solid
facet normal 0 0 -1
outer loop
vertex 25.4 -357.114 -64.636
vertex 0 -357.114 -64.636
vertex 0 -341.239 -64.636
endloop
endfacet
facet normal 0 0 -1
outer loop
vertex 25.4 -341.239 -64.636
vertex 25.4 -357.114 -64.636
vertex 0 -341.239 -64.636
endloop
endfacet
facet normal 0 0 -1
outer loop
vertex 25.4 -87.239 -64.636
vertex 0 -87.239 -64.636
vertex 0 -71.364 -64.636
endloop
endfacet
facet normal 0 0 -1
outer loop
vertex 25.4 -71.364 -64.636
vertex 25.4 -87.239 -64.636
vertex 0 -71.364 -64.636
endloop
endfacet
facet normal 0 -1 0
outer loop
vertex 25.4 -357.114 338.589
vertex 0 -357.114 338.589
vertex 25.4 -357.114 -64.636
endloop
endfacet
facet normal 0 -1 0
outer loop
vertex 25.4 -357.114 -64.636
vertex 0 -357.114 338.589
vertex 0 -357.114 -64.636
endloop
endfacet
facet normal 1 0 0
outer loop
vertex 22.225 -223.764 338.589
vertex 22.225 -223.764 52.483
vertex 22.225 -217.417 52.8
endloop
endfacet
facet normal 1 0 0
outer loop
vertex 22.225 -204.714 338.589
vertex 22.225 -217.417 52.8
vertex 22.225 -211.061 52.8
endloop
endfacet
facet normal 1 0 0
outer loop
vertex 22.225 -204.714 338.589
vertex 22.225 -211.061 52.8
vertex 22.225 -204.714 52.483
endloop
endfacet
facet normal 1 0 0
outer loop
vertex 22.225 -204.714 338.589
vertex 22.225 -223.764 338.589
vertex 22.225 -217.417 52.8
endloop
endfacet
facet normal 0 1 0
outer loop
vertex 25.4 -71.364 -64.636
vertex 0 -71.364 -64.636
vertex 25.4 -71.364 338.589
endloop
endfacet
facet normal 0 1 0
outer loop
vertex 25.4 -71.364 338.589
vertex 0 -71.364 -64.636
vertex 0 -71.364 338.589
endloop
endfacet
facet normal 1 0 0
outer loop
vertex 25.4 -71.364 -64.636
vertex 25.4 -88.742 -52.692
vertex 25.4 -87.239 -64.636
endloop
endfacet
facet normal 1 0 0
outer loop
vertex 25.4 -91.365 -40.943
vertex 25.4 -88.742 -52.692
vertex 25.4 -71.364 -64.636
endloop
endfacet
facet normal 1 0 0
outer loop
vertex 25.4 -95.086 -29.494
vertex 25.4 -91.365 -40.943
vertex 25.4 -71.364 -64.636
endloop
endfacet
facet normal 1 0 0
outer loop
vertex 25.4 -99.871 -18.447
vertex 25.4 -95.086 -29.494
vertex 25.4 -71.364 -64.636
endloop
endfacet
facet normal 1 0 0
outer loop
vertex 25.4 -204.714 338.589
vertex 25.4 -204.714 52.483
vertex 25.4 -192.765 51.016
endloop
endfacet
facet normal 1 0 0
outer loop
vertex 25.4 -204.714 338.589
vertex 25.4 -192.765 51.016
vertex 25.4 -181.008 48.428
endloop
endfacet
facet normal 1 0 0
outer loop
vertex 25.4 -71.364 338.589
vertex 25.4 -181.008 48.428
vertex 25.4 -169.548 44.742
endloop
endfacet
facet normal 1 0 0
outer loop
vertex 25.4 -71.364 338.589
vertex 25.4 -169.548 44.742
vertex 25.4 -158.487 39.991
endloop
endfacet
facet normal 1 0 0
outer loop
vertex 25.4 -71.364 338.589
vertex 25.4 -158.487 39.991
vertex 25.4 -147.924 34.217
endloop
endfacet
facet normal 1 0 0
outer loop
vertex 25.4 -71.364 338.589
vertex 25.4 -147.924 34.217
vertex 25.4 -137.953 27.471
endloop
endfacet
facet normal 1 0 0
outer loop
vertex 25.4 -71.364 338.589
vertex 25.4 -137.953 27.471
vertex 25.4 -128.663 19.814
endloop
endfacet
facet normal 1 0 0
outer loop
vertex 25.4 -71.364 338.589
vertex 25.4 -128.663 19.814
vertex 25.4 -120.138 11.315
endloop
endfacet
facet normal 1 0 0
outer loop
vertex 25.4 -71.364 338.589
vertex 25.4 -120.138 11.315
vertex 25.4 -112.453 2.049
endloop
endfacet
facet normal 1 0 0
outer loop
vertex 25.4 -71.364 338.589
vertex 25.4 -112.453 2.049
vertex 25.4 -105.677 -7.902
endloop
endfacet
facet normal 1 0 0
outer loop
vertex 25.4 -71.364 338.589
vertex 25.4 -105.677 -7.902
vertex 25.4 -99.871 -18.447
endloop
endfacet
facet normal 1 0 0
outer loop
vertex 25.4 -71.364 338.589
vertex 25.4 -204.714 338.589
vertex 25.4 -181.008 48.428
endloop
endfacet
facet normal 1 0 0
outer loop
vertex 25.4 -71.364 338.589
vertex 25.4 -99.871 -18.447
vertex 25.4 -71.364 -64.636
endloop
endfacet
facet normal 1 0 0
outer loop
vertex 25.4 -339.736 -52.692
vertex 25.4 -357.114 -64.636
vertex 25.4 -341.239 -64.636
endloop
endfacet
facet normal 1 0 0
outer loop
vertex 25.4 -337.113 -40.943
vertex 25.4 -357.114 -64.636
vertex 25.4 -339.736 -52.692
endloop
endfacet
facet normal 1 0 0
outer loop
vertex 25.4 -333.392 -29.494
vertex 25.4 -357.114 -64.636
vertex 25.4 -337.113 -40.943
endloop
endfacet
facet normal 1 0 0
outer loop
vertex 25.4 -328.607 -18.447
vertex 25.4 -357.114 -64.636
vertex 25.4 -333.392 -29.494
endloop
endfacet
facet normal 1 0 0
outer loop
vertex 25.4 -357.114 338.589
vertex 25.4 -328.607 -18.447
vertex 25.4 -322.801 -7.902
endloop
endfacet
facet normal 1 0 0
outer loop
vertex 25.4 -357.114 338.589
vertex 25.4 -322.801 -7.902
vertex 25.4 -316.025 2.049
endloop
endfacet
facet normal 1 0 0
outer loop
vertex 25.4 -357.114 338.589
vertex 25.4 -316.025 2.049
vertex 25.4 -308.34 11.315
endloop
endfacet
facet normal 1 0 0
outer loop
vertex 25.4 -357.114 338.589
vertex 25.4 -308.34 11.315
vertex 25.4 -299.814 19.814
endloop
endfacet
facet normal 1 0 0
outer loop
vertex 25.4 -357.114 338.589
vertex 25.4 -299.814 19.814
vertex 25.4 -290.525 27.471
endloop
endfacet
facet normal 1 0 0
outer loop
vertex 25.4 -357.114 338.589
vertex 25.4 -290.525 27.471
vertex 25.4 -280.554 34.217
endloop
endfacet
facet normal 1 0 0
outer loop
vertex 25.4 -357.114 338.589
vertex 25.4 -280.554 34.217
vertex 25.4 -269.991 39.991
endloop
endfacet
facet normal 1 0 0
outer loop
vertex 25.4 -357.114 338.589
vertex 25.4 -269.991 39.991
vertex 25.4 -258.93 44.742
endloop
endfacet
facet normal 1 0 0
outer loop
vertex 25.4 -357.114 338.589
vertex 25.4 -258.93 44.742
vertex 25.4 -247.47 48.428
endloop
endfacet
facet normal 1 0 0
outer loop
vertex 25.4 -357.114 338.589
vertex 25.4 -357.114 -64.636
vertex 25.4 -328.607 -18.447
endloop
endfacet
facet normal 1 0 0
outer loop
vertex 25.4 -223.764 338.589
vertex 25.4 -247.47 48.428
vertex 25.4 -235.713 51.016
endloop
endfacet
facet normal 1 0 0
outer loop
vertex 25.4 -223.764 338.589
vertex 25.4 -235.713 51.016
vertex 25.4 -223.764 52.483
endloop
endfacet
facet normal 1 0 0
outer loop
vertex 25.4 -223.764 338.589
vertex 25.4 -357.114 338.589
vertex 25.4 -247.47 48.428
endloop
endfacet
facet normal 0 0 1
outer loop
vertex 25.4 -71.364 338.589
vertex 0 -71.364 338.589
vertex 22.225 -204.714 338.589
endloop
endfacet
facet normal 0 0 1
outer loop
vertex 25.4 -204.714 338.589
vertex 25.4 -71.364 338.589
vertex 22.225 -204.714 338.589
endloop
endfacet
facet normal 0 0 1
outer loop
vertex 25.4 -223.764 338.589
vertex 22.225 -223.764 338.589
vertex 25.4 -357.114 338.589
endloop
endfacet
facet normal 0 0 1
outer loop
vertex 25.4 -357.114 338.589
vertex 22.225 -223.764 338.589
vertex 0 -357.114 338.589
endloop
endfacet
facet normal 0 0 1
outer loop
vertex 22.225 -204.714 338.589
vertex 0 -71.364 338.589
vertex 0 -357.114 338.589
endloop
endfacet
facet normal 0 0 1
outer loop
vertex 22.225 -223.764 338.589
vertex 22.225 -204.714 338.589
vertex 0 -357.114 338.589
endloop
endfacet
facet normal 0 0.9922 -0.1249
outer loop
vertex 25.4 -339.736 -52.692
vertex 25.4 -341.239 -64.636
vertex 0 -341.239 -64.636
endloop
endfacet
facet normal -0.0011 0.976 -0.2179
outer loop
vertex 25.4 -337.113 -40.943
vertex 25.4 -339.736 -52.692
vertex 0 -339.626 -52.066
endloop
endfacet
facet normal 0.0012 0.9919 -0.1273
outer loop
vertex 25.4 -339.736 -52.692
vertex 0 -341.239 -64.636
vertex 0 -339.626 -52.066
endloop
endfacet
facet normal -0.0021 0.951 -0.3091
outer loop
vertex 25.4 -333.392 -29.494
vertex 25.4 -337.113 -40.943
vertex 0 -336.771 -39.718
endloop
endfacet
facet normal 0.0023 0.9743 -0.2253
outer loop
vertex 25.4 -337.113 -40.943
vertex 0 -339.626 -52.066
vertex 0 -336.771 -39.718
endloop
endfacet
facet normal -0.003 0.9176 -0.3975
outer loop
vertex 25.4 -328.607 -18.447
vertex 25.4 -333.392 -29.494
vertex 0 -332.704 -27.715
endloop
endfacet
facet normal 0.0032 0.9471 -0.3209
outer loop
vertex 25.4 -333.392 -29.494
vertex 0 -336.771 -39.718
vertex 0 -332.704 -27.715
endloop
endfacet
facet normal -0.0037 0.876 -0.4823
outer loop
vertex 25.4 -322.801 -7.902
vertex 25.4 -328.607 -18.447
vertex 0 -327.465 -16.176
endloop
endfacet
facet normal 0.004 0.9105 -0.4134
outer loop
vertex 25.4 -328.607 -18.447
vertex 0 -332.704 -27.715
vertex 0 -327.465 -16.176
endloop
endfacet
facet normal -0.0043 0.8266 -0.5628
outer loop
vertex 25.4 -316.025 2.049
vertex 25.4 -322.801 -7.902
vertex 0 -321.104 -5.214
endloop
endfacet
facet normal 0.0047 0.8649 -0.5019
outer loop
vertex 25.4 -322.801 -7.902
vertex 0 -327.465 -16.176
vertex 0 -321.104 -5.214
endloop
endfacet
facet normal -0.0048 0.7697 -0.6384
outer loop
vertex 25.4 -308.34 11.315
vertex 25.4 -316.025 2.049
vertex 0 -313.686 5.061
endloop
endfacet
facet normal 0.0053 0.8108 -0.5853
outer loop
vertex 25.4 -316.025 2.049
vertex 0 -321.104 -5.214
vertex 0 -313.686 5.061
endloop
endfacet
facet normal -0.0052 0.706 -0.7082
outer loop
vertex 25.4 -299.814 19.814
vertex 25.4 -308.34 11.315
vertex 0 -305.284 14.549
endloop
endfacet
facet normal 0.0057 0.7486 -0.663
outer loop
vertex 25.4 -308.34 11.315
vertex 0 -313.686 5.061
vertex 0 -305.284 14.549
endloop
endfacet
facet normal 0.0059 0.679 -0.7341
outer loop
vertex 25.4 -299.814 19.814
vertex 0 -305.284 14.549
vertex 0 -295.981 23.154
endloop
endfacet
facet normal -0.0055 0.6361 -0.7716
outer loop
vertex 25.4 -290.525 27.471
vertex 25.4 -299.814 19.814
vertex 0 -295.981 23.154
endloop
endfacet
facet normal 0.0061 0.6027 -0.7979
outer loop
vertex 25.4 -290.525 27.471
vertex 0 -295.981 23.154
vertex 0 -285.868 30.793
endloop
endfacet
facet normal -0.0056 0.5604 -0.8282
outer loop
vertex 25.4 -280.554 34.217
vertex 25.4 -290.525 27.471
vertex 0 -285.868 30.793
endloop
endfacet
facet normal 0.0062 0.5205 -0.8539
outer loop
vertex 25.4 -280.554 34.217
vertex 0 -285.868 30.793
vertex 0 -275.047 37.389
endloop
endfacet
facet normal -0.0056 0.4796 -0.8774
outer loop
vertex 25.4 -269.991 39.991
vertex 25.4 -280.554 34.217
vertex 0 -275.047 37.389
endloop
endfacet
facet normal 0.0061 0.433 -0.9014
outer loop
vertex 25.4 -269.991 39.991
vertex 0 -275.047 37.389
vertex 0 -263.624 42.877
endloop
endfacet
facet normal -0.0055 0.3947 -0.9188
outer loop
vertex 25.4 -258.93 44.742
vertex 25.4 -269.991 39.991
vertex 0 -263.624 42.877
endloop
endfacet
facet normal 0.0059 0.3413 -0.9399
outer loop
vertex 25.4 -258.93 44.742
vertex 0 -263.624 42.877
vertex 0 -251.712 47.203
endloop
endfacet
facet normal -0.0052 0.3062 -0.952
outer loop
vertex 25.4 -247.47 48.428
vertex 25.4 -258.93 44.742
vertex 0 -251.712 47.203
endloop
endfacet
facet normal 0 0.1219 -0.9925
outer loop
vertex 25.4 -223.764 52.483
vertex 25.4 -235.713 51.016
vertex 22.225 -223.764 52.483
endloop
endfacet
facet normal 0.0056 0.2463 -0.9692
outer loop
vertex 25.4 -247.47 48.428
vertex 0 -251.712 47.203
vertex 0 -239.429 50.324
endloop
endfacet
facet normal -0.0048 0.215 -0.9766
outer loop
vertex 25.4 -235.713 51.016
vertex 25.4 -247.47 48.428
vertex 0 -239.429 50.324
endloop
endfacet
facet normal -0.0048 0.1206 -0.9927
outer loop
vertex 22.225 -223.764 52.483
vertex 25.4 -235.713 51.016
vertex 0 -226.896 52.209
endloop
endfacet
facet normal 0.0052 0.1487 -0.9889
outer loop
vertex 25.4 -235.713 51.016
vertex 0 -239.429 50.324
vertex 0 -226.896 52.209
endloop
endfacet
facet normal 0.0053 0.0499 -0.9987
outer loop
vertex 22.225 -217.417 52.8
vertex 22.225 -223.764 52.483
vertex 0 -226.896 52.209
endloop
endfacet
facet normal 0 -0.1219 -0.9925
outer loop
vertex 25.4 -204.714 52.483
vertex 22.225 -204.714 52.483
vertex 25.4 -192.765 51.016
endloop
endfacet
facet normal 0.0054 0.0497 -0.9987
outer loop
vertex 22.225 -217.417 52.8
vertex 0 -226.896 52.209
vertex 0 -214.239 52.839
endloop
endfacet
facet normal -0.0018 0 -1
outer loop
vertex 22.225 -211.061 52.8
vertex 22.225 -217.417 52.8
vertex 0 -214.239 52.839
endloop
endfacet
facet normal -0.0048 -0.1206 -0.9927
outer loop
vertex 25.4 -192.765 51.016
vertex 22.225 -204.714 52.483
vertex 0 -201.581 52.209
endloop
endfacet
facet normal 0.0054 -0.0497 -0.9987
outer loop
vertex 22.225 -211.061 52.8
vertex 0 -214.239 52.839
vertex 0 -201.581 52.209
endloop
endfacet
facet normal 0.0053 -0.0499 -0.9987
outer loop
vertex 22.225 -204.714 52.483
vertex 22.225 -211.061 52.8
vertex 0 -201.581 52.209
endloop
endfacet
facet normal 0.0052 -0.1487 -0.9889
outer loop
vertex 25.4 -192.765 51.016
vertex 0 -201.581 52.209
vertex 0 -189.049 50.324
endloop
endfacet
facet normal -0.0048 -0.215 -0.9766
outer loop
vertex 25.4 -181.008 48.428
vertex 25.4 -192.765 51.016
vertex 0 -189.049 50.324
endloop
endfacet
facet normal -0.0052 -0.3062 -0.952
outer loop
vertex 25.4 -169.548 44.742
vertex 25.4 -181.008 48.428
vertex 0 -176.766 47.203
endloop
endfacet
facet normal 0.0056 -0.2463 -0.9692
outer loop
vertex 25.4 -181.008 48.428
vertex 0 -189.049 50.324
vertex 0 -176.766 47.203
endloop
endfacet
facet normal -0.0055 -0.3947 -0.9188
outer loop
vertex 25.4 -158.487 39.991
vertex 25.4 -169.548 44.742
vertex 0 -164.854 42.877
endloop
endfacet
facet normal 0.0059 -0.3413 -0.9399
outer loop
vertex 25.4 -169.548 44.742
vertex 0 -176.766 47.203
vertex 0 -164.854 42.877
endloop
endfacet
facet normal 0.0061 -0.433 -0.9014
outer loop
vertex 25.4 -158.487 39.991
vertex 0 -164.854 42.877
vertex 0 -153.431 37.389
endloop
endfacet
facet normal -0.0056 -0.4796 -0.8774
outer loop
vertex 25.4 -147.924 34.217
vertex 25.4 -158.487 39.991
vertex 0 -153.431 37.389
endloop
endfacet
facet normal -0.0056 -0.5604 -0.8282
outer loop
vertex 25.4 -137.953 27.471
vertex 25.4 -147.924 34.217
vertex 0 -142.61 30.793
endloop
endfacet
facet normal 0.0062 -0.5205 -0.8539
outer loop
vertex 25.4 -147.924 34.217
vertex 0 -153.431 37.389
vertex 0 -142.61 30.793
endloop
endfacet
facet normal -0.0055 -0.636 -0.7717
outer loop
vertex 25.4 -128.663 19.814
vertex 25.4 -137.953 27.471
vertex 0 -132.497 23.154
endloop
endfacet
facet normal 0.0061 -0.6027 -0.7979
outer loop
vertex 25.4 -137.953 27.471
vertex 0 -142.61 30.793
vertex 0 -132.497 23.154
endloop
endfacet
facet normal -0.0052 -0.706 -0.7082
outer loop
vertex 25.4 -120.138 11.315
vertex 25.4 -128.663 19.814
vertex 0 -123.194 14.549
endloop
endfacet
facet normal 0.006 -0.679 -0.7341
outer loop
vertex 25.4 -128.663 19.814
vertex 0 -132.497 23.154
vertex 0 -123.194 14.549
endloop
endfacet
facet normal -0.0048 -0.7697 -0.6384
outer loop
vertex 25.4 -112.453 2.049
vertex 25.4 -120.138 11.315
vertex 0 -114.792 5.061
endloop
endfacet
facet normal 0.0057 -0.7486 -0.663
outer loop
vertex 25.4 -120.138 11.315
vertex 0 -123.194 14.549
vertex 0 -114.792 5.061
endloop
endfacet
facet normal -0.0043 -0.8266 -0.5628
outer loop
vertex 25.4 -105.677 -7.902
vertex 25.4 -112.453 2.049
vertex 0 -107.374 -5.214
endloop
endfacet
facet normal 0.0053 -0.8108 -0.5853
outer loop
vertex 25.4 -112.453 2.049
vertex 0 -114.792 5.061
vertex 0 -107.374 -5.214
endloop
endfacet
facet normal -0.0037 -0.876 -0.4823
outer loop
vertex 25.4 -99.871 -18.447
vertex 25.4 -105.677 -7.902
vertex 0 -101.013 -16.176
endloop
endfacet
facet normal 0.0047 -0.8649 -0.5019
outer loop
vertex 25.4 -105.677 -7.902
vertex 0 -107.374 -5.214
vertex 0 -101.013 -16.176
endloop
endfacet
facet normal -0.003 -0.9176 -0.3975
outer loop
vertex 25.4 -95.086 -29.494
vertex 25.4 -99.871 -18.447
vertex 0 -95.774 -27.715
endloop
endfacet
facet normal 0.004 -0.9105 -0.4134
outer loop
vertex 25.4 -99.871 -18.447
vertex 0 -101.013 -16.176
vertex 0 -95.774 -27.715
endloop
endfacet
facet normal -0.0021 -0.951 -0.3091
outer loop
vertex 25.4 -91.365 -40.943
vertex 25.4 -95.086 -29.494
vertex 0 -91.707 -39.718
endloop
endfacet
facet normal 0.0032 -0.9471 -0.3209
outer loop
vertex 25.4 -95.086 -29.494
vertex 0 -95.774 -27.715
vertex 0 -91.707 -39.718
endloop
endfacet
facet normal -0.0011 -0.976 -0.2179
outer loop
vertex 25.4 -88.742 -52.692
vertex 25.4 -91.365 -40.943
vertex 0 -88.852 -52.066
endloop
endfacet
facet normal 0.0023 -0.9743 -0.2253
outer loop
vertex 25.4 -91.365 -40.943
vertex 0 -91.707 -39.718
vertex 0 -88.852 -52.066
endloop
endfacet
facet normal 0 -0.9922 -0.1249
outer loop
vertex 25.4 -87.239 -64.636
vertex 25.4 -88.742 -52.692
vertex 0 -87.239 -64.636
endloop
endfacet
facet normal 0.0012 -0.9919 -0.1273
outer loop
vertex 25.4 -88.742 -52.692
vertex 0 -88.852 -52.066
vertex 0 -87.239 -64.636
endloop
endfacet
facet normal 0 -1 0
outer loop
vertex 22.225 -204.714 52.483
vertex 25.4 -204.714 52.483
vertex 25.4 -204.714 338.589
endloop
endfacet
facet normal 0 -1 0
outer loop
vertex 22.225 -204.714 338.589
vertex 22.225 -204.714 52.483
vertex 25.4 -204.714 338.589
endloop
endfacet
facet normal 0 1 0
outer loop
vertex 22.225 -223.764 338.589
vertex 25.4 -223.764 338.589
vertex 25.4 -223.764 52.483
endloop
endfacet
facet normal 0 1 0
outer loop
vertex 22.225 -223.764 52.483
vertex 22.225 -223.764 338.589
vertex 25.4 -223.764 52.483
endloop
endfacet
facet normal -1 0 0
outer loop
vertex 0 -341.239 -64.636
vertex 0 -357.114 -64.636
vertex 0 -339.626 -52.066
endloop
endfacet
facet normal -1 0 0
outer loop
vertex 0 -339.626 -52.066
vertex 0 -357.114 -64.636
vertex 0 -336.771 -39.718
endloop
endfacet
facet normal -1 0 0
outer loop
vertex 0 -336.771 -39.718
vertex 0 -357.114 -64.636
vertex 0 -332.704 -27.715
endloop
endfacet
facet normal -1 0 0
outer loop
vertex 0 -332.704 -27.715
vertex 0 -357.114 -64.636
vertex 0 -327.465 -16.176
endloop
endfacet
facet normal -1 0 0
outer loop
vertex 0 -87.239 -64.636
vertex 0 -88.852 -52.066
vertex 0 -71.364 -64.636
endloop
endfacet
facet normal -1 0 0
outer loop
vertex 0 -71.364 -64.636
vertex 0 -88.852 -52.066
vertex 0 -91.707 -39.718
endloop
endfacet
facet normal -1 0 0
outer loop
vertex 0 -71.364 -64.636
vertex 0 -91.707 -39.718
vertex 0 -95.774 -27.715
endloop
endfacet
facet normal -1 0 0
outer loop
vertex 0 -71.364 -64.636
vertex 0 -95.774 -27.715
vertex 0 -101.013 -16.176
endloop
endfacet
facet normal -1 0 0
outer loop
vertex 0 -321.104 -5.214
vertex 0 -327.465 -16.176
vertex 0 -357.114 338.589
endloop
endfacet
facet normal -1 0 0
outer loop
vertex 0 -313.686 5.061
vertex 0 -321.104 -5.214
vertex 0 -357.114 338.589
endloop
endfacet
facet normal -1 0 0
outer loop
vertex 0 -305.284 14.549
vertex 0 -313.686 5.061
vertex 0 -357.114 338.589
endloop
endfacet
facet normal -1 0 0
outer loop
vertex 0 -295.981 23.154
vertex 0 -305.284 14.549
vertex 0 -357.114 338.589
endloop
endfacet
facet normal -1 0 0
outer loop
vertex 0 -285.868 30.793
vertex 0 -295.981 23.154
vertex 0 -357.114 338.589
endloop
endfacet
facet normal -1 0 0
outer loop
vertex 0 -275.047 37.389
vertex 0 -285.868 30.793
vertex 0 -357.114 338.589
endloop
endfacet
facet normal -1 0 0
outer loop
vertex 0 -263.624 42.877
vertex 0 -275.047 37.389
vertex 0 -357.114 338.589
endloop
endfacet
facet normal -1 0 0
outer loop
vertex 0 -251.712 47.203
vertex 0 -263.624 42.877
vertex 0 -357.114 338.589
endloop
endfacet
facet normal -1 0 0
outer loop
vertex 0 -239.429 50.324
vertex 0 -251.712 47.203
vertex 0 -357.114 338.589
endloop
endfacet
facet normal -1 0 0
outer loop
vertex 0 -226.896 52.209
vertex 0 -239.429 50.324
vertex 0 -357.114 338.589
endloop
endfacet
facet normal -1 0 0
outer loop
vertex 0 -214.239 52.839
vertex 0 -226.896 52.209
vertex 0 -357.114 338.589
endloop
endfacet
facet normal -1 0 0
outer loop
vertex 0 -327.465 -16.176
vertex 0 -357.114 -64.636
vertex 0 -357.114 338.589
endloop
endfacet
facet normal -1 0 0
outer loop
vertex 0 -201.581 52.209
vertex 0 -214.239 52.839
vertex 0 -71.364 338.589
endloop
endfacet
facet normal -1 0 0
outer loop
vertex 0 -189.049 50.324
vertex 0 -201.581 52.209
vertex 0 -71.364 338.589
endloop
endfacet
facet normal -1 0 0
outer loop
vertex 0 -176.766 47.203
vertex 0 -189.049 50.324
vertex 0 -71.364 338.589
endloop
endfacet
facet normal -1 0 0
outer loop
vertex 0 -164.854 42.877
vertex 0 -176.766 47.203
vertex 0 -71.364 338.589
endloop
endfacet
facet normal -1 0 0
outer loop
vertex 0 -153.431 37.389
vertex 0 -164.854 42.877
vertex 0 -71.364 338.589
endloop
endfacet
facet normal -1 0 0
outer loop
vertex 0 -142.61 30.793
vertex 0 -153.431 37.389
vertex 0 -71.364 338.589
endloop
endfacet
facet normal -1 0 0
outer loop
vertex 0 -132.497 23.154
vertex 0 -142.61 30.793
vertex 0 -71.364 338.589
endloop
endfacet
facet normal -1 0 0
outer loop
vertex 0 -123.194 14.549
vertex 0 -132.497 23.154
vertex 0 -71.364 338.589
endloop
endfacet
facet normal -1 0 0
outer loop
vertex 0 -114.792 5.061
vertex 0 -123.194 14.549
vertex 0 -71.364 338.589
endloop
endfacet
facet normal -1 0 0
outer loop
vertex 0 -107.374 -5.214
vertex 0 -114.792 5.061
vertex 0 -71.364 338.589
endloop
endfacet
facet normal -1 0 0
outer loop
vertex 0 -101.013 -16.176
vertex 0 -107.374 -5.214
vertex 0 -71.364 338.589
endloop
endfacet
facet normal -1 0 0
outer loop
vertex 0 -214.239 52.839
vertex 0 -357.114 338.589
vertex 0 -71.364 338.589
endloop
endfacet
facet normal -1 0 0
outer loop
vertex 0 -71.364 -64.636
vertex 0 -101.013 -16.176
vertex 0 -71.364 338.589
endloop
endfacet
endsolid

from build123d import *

# Parameters (mm, degrees)
F1_DEPTH = 25.4
F3_DEPTH = 3.175


with BuildPart() as f1:
    # F0 (on Right) → F1 (new body)
    with BuildSketch(Plane.YZ):
        with BuildLine():
            Line((-71.363949, 338.589144), (-357.113949, 338.589144))
            Line((-357.113949, 338.589144), (-357.113949, -64.635856))
            Line((-357.113949, -64.635856), (-341.238949, -64.635856))
            ThreePointArc((-341.238949, -64.635856), (-214.238949, 52.839144), (-87.238949, -64.635856))
            Line((-87.238949, -64.635856), (-71.363949, -64.635856))
            Line((-71.363949, -64.635856), (-71.363949, 338.589144))
        make_face()
    extrude(amount=F1_DEPTH)

    # F2 (on face) → F3 (cut)
    with BuildSketch(Plane.YZ.offset(25.4)):
        with BuildLine():
            Line((-204.713949, 338.589144), (-214.238949, 338.589144))
            Line((-214.238949, 338.589144), (-223.763949, 338.589144))
            Line((-223.763949, 338.589144), (-223.763949, 52.48254))
            ThreePointArc((-223.763949, 52.48254), (-214.238949, 52.839144), (-204.713949, 52.48254))
            Line((-204.713949, 52.48254), (-204.713949, 338.589144))
        make_face()
        with BuildLine():
            ThreePointArc((-204.713949, 52.48254), (-214.238949, 52.839144), (-223.763949, 52.48254))
            Line((-223.763949, 52.48254), (-223.763949, 26.907945))
            Line((-223.763949, 26.907945), (-204.713949, 26.907945))
            Line((-204.713949, 26.907945), (-204.713949, 52.48254))
        make_face()
    extrude(amount=-F3_DEPTH, mode=Mode.SUBTRACT)


solid = f1.part
